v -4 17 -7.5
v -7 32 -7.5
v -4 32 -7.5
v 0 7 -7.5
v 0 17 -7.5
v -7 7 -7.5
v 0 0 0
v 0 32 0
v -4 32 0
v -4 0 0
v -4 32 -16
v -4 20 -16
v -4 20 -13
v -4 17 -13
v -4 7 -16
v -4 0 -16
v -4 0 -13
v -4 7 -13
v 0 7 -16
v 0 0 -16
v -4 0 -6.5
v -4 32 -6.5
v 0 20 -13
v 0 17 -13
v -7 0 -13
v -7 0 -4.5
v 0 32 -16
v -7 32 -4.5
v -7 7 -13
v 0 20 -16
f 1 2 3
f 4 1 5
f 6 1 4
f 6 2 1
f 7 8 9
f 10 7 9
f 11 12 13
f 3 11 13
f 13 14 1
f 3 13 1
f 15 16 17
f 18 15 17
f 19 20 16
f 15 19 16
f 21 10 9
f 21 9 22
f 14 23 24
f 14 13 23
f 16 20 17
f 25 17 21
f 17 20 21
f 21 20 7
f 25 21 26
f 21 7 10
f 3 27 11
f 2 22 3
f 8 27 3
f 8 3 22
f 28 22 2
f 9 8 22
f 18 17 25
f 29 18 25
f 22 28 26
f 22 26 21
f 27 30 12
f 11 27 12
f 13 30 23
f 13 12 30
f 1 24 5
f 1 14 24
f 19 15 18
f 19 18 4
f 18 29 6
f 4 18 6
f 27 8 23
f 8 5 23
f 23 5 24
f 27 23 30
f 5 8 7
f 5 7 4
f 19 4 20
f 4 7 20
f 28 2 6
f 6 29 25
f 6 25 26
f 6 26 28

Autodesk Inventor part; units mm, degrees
ref_plane "YZ Plane" through (0, 0, 0) normal (1, 0, 0) x (0, 1, 0)
ref_plane "XZ Plane" through (0, 0, 0) normal (0, 1, 0) x (-1, 0, 0)
ref_plane "XY Plane" through (0, 0, 0) normal (0, 0, 1) x (1, 0, 0)
sketch "Sketch1" plane through (0, 0, 0) normal (0, 1, 0) x (-1, 0, 0)
  line L0 (0, 0) -> (0, -16)
  line L1 (0, -16) -> (4, -16)
  line L2 (0, 0) -> (4, 0)
  line L3 (4, 0) -> (4, -6.5)
  line L4 (4, -16) -> (4, -13)
  line L5 (4, -13) -> (7, -13)
  line L6 (7, -13) -> (7, -4.5)
  line L7 (7, -4.5) -> (4, -6.5)
  dimension "d0" = 16
  dimension "d1" = 4
  dimension "d2" = 6.5
  dimension "d3" = 3
  dimension "d4" = 3
  dimension "d5" = 8.5
extrude "Extrusion1" add sketch "Sketch1" along normal blind 32
sketch "Sketch2" plane through (-7, 0, -13) normal (-1, 0, 0) x (0, 0, 1)
  line L0 (0, 0) -> (8.5, 0) projected
  line L1 (8.5, 0) -> (8.5, 32) projected
  line L2 (0, 32) -> (8.5, 32) projected
  line L3 (0, 0) -> (0, 32) projected
  line L4 (0, 32) -> (8.5, 32) projected
  line L5 (5.5, 32) -> (5.5, 7)
  line L6 (5.5, 7) -> (0, 7)
  line L7 (0, 0) -> (0, 32) projected
  point P0 (13, 0)
  dimension "d8" = 25
  dimension "d9" = 5.5
extrude "Extrusion2" cut sketch "Sketch2" against normal blind 3 contours L3 L2 L5 L6
sketch "Sketch3" plane through (-4, 0, -16) normal (-1, 0, 0) x (0, 0, 1)
  line L0 (0, 0) -> (3, 0) projected
  line L1 (3, 0) -> (3, 7) projected
  line L2 (8.5, 7) -> (3, 7) projected
  line L3 (8.5, 32) -> (8.5, 7) projected
  line L4 (0, 32) -> (8.5, 32) projected
  line L5 (0, 0) -> (0, 32) projected
  line L6 (0, 0) -> (0, 32) projected
  line L7 (0, 32) -> (0, 20)
  line L8 (0, 20) -> (3, 20)
  line L9 (8.5, 32) -> (8.5, 7) projected
  line L10 (0, 32) -> (8.5, 32) projected
  line L11 (3, 32) -> (3, 17)
  line L12 (3, 17) -> (8.5, 17)
  line L13 (0, 0) -> (0, 32) projected
  line L14 (0, 7) -> (3, 7)
  point P0 (16, 0)
  dimension "d12" = 12
  dimension "d13" = 15
  dimension "d14" = 3
extrude "Extrusion3" cut sketch "Sketch3" against normal blind 4 contours L5 L8 L11 L12 L3 L2 L14
properties part number "Inner Rails 2"
